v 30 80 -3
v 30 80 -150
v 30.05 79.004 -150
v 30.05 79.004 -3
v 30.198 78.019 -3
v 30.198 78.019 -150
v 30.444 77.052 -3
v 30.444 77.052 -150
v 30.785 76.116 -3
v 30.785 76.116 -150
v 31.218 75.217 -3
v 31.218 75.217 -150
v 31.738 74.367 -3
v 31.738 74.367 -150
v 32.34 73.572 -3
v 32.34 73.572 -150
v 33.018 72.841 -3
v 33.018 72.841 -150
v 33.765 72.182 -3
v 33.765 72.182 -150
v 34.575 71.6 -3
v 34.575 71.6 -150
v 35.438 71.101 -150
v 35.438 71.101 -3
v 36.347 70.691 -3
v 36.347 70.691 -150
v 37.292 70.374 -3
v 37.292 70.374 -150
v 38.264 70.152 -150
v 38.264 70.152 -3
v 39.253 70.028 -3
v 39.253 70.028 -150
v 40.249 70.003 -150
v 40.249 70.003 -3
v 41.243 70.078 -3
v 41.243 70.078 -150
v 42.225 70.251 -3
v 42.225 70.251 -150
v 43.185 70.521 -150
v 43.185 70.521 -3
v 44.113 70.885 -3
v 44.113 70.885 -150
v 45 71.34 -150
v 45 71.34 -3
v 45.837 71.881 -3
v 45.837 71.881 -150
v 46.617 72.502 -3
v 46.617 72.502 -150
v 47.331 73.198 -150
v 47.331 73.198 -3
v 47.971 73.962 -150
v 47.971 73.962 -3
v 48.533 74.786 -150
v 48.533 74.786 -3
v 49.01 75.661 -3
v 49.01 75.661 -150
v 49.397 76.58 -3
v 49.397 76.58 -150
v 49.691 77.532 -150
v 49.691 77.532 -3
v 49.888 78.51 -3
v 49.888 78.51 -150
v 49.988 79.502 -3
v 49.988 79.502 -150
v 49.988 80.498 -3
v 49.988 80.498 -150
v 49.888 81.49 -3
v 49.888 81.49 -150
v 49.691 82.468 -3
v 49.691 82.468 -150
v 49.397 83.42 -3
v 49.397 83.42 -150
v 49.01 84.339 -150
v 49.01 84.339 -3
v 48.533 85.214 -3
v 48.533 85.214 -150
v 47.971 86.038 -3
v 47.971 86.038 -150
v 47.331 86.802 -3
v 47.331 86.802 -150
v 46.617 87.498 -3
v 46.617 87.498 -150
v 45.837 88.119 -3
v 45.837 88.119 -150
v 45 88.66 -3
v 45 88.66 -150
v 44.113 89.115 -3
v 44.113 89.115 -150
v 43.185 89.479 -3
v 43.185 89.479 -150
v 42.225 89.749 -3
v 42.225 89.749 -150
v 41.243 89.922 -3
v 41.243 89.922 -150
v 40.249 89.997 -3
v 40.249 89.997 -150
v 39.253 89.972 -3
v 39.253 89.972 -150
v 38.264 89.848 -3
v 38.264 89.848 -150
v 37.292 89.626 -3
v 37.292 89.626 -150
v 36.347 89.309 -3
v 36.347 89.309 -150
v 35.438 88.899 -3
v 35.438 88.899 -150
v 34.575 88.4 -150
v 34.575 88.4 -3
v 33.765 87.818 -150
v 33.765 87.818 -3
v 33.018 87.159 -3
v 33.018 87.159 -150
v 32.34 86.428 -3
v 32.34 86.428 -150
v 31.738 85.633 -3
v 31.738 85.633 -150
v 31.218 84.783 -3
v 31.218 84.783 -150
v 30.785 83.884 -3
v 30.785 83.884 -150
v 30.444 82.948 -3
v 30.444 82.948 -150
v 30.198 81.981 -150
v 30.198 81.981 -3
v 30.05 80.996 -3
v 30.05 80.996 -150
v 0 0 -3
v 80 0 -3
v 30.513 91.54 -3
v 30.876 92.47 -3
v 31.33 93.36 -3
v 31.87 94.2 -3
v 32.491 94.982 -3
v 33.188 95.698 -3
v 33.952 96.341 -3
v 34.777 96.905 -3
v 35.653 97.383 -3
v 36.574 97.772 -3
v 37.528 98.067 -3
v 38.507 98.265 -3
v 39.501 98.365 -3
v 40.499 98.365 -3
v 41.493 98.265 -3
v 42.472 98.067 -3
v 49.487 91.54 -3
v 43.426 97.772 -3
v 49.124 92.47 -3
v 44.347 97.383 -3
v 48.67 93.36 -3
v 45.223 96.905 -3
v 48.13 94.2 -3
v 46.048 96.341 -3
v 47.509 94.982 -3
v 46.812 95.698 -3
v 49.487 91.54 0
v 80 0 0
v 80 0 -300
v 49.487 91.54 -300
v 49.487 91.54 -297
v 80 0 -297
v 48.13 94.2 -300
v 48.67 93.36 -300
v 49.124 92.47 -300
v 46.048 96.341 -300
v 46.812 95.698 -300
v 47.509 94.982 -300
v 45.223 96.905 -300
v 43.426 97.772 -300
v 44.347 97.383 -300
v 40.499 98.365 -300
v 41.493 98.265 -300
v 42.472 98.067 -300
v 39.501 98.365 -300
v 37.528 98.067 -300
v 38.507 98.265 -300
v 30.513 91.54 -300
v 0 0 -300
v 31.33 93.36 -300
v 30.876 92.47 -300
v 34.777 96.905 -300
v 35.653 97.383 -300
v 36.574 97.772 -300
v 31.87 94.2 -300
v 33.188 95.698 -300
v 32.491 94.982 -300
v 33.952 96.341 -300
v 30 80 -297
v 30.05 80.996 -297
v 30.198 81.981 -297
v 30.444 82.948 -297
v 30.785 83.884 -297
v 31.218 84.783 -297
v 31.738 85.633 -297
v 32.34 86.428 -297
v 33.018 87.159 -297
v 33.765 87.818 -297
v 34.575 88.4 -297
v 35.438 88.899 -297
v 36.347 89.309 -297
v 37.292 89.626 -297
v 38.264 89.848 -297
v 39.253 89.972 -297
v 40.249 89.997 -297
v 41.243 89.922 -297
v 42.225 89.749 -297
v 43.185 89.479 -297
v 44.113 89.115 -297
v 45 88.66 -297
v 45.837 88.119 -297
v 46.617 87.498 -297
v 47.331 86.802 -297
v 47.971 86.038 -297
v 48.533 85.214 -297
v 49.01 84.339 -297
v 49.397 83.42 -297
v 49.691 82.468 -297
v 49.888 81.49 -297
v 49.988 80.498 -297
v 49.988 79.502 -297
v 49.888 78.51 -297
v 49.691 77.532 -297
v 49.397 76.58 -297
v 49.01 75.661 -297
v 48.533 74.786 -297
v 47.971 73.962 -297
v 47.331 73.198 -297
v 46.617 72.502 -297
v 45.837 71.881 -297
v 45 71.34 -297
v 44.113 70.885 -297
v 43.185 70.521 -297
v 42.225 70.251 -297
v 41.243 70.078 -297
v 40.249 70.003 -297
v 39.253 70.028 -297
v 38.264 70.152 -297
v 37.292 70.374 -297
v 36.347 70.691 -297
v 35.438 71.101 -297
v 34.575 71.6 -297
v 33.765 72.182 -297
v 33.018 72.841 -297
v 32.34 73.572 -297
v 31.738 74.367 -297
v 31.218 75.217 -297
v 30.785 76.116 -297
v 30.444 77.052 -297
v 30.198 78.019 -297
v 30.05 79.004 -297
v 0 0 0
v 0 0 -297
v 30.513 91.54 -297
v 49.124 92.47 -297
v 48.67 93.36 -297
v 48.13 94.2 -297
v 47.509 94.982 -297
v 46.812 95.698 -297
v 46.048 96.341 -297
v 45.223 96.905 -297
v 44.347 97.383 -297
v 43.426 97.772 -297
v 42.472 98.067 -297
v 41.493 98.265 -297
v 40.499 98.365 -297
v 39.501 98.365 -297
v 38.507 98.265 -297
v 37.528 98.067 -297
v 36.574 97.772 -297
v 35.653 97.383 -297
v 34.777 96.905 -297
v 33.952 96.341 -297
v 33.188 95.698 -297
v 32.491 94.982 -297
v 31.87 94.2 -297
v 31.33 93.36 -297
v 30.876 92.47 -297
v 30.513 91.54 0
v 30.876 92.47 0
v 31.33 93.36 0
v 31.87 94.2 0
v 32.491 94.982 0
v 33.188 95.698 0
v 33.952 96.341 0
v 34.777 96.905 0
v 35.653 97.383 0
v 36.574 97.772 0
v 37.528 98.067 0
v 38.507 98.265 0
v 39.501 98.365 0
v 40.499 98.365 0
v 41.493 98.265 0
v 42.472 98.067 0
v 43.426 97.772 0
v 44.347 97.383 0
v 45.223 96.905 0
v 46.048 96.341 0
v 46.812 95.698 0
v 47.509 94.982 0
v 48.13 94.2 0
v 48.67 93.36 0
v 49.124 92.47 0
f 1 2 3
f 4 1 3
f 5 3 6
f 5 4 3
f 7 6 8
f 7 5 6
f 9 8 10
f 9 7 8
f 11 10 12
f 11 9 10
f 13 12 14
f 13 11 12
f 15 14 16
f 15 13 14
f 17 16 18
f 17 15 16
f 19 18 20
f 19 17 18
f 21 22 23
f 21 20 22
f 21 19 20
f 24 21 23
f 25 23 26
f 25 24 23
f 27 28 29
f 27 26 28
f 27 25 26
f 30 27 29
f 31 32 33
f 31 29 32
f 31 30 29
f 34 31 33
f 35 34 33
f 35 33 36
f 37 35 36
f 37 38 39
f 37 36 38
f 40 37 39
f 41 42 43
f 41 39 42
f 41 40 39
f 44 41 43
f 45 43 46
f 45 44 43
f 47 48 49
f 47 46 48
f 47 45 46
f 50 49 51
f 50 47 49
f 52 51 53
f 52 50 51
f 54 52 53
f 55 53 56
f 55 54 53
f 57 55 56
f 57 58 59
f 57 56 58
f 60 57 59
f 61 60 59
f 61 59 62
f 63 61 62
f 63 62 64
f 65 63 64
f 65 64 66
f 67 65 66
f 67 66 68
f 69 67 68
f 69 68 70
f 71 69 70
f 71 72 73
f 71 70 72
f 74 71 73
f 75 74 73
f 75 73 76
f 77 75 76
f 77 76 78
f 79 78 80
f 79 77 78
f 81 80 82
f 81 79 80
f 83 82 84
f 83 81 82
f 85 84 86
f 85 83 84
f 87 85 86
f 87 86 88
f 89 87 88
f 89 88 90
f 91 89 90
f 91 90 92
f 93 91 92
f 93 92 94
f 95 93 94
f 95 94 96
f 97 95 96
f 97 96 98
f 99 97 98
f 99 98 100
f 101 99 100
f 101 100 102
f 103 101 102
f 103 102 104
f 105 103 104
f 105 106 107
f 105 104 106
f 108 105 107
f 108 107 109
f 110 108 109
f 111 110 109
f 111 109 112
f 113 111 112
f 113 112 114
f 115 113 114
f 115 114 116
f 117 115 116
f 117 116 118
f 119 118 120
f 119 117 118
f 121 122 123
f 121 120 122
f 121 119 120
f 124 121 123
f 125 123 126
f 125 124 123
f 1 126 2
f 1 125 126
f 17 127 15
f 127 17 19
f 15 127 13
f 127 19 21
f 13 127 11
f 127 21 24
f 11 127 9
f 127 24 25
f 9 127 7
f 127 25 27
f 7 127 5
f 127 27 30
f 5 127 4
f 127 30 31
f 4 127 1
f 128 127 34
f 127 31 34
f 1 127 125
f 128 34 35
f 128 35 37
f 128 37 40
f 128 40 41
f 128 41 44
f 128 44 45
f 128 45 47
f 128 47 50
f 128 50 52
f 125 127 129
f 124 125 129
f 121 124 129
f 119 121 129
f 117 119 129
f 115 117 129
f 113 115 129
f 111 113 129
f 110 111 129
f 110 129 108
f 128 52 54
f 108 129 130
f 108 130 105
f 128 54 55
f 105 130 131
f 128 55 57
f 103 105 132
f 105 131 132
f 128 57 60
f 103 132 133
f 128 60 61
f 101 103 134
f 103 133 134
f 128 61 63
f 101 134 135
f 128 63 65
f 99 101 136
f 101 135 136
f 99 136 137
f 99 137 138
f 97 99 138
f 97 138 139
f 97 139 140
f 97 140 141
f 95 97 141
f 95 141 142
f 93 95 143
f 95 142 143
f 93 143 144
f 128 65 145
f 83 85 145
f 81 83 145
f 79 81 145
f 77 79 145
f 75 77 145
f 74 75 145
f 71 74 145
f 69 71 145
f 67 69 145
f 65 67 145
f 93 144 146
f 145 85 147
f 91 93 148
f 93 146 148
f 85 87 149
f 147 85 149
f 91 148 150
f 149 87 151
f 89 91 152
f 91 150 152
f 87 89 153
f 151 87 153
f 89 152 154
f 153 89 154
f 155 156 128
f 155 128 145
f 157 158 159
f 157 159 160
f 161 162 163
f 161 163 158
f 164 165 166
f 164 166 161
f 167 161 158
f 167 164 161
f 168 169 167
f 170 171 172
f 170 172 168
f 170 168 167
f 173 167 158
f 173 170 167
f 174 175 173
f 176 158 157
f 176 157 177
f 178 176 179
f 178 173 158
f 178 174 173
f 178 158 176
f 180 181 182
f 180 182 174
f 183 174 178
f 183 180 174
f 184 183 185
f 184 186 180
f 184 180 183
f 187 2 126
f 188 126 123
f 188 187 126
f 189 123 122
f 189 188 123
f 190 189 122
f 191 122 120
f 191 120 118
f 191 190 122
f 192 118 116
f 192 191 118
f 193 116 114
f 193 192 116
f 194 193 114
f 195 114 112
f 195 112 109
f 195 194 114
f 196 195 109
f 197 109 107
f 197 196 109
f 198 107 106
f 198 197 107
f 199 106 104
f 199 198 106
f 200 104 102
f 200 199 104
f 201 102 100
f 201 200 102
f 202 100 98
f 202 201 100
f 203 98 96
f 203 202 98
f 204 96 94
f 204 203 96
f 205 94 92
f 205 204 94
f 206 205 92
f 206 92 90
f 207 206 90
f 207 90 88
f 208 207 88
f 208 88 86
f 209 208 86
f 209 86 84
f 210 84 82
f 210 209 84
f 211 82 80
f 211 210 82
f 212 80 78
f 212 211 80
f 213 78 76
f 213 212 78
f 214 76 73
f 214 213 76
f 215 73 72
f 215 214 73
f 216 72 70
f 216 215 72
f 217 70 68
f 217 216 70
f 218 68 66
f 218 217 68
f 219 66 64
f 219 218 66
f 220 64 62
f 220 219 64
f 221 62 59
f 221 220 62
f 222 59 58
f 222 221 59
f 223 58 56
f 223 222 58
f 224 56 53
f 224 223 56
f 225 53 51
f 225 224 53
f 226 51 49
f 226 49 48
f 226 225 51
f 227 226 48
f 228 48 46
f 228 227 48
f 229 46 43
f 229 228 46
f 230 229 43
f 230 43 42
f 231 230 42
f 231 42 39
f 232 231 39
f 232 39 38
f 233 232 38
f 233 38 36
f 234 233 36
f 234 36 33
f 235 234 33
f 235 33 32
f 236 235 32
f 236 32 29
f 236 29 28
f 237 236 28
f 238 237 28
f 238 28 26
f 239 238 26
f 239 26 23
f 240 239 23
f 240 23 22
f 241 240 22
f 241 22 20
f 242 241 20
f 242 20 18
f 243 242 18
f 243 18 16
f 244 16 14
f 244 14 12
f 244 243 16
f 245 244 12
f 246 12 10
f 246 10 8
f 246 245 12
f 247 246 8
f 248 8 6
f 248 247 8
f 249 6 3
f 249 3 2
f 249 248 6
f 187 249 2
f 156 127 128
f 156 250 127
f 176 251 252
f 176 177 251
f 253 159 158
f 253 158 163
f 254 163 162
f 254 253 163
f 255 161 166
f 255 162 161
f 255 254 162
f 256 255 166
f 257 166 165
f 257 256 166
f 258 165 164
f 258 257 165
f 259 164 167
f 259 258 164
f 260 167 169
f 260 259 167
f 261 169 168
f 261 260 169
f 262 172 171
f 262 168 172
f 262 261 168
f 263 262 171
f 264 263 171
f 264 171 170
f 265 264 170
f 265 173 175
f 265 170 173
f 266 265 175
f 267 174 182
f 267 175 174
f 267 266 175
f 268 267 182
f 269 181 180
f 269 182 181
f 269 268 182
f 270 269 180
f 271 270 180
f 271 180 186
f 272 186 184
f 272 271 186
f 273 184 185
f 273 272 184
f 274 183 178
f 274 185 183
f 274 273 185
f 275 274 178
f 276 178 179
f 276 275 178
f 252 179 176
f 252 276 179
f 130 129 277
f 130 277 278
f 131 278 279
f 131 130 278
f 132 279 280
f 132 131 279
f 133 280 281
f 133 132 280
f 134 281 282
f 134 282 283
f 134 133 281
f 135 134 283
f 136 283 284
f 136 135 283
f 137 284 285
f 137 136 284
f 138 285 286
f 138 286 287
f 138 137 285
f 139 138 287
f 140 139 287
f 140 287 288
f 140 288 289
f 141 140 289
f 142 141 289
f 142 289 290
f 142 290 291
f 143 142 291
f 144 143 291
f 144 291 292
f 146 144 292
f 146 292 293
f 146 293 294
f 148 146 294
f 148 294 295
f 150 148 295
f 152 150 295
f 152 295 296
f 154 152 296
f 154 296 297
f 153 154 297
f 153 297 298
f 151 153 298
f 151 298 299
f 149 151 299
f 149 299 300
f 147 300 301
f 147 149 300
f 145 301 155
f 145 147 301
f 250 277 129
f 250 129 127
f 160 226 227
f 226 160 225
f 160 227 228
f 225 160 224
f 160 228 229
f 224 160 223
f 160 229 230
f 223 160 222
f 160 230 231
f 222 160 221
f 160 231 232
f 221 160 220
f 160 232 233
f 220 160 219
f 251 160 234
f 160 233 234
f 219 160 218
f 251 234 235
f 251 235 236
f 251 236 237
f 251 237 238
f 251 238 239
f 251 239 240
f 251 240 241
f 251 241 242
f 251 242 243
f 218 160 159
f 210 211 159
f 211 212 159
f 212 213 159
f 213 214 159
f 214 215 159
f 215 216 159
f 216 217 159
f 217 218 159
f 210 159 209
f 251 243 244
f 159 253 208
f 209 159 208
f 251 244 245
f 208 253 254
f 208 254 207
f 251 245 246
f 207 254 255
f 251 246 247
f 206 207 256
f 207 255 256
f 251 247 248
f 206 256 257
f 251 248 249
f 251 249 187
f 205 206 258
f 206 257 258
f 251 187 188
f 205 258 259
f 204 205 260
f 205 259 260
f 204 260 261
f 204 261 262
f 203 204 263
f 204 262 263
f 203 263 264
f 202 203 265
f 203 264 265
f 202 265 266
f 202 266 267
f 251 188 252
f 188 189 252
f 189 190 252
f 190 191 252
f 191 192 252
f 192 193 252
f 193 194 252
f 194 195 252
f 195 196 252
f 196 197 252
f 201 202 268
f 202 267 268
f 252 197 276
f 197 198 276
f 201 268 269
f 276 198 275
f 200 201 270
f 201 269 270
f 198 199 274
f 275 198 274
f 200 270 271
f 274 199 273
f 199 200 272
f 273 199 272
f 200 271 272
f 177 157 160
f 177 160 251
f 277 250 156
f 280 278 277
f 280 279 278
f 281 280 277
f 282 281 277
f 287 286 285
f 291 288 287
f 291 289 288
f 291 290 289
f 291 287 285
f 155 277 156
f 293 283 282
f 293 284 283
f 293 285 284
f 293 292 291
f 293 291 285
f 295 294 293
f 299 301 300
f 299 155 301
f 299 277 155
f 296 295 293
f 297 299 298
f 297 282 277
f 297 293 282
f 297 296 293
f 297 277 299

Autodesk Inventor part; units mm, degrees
ref_plane "YZ Plane" through (0, 0, 0) normal (1, 0, 0) x (0, 1, 0)
ref_plane "XZ Plane" through (0, 0, 0) normal (0, 1, 0) x (-1, 0, 0)
ref_plane "XY Plane" through (0, 0, 0) normal (0, 0, 1) x (1, 0, 0)
sketch "Sketch1" plane through (0, 0, 0) normal (0, 0, 1) x (1, 0, 0)
  point P0 (0, 0)
sketch "Sketch2" plane through (0, 0, 0) normal (0, 0, 1) x (1, 0, 0)
  line L0 (0, 0) -> (80, 0)
  line L1 (80, 0) -> (40, 120)
  line L2 (40, 120) -> (0, 0)
  dimension "d0" = 80
  dimension "d1" = 120
  dimension "d2" = 40
extrude "Extrusion1" add sketch "Sketch2" against normal blind 3
sketch "Sketch3" plane through (0, 0, -3) normal (0, 0, -1) x (-1, 0, 0)
  circle A0 centre (-40, 80) radius 10
  line L0 (-80, 0) -> (0, 0) projected
  point P0 (-40, 120)
  point P1 (-40, 0)
  dimension "d5" = 20
  dimension "d6" = 0
  dimension "d7" = 80
fillet "Fillet1" radius 10 1 edges at (40, 120, -1.5)
extrude "Extrusion2" add sketch "Sketch3" along normal blind 147
mirror "Mirror1" about plane through (40, 80, -150) normal (0, 0, -1) of "Extrusion2", "Extrusion1"
fillet "Fillet2" radius 10 1 edges at (40, 120, -298.5)
properties part number "stand"
